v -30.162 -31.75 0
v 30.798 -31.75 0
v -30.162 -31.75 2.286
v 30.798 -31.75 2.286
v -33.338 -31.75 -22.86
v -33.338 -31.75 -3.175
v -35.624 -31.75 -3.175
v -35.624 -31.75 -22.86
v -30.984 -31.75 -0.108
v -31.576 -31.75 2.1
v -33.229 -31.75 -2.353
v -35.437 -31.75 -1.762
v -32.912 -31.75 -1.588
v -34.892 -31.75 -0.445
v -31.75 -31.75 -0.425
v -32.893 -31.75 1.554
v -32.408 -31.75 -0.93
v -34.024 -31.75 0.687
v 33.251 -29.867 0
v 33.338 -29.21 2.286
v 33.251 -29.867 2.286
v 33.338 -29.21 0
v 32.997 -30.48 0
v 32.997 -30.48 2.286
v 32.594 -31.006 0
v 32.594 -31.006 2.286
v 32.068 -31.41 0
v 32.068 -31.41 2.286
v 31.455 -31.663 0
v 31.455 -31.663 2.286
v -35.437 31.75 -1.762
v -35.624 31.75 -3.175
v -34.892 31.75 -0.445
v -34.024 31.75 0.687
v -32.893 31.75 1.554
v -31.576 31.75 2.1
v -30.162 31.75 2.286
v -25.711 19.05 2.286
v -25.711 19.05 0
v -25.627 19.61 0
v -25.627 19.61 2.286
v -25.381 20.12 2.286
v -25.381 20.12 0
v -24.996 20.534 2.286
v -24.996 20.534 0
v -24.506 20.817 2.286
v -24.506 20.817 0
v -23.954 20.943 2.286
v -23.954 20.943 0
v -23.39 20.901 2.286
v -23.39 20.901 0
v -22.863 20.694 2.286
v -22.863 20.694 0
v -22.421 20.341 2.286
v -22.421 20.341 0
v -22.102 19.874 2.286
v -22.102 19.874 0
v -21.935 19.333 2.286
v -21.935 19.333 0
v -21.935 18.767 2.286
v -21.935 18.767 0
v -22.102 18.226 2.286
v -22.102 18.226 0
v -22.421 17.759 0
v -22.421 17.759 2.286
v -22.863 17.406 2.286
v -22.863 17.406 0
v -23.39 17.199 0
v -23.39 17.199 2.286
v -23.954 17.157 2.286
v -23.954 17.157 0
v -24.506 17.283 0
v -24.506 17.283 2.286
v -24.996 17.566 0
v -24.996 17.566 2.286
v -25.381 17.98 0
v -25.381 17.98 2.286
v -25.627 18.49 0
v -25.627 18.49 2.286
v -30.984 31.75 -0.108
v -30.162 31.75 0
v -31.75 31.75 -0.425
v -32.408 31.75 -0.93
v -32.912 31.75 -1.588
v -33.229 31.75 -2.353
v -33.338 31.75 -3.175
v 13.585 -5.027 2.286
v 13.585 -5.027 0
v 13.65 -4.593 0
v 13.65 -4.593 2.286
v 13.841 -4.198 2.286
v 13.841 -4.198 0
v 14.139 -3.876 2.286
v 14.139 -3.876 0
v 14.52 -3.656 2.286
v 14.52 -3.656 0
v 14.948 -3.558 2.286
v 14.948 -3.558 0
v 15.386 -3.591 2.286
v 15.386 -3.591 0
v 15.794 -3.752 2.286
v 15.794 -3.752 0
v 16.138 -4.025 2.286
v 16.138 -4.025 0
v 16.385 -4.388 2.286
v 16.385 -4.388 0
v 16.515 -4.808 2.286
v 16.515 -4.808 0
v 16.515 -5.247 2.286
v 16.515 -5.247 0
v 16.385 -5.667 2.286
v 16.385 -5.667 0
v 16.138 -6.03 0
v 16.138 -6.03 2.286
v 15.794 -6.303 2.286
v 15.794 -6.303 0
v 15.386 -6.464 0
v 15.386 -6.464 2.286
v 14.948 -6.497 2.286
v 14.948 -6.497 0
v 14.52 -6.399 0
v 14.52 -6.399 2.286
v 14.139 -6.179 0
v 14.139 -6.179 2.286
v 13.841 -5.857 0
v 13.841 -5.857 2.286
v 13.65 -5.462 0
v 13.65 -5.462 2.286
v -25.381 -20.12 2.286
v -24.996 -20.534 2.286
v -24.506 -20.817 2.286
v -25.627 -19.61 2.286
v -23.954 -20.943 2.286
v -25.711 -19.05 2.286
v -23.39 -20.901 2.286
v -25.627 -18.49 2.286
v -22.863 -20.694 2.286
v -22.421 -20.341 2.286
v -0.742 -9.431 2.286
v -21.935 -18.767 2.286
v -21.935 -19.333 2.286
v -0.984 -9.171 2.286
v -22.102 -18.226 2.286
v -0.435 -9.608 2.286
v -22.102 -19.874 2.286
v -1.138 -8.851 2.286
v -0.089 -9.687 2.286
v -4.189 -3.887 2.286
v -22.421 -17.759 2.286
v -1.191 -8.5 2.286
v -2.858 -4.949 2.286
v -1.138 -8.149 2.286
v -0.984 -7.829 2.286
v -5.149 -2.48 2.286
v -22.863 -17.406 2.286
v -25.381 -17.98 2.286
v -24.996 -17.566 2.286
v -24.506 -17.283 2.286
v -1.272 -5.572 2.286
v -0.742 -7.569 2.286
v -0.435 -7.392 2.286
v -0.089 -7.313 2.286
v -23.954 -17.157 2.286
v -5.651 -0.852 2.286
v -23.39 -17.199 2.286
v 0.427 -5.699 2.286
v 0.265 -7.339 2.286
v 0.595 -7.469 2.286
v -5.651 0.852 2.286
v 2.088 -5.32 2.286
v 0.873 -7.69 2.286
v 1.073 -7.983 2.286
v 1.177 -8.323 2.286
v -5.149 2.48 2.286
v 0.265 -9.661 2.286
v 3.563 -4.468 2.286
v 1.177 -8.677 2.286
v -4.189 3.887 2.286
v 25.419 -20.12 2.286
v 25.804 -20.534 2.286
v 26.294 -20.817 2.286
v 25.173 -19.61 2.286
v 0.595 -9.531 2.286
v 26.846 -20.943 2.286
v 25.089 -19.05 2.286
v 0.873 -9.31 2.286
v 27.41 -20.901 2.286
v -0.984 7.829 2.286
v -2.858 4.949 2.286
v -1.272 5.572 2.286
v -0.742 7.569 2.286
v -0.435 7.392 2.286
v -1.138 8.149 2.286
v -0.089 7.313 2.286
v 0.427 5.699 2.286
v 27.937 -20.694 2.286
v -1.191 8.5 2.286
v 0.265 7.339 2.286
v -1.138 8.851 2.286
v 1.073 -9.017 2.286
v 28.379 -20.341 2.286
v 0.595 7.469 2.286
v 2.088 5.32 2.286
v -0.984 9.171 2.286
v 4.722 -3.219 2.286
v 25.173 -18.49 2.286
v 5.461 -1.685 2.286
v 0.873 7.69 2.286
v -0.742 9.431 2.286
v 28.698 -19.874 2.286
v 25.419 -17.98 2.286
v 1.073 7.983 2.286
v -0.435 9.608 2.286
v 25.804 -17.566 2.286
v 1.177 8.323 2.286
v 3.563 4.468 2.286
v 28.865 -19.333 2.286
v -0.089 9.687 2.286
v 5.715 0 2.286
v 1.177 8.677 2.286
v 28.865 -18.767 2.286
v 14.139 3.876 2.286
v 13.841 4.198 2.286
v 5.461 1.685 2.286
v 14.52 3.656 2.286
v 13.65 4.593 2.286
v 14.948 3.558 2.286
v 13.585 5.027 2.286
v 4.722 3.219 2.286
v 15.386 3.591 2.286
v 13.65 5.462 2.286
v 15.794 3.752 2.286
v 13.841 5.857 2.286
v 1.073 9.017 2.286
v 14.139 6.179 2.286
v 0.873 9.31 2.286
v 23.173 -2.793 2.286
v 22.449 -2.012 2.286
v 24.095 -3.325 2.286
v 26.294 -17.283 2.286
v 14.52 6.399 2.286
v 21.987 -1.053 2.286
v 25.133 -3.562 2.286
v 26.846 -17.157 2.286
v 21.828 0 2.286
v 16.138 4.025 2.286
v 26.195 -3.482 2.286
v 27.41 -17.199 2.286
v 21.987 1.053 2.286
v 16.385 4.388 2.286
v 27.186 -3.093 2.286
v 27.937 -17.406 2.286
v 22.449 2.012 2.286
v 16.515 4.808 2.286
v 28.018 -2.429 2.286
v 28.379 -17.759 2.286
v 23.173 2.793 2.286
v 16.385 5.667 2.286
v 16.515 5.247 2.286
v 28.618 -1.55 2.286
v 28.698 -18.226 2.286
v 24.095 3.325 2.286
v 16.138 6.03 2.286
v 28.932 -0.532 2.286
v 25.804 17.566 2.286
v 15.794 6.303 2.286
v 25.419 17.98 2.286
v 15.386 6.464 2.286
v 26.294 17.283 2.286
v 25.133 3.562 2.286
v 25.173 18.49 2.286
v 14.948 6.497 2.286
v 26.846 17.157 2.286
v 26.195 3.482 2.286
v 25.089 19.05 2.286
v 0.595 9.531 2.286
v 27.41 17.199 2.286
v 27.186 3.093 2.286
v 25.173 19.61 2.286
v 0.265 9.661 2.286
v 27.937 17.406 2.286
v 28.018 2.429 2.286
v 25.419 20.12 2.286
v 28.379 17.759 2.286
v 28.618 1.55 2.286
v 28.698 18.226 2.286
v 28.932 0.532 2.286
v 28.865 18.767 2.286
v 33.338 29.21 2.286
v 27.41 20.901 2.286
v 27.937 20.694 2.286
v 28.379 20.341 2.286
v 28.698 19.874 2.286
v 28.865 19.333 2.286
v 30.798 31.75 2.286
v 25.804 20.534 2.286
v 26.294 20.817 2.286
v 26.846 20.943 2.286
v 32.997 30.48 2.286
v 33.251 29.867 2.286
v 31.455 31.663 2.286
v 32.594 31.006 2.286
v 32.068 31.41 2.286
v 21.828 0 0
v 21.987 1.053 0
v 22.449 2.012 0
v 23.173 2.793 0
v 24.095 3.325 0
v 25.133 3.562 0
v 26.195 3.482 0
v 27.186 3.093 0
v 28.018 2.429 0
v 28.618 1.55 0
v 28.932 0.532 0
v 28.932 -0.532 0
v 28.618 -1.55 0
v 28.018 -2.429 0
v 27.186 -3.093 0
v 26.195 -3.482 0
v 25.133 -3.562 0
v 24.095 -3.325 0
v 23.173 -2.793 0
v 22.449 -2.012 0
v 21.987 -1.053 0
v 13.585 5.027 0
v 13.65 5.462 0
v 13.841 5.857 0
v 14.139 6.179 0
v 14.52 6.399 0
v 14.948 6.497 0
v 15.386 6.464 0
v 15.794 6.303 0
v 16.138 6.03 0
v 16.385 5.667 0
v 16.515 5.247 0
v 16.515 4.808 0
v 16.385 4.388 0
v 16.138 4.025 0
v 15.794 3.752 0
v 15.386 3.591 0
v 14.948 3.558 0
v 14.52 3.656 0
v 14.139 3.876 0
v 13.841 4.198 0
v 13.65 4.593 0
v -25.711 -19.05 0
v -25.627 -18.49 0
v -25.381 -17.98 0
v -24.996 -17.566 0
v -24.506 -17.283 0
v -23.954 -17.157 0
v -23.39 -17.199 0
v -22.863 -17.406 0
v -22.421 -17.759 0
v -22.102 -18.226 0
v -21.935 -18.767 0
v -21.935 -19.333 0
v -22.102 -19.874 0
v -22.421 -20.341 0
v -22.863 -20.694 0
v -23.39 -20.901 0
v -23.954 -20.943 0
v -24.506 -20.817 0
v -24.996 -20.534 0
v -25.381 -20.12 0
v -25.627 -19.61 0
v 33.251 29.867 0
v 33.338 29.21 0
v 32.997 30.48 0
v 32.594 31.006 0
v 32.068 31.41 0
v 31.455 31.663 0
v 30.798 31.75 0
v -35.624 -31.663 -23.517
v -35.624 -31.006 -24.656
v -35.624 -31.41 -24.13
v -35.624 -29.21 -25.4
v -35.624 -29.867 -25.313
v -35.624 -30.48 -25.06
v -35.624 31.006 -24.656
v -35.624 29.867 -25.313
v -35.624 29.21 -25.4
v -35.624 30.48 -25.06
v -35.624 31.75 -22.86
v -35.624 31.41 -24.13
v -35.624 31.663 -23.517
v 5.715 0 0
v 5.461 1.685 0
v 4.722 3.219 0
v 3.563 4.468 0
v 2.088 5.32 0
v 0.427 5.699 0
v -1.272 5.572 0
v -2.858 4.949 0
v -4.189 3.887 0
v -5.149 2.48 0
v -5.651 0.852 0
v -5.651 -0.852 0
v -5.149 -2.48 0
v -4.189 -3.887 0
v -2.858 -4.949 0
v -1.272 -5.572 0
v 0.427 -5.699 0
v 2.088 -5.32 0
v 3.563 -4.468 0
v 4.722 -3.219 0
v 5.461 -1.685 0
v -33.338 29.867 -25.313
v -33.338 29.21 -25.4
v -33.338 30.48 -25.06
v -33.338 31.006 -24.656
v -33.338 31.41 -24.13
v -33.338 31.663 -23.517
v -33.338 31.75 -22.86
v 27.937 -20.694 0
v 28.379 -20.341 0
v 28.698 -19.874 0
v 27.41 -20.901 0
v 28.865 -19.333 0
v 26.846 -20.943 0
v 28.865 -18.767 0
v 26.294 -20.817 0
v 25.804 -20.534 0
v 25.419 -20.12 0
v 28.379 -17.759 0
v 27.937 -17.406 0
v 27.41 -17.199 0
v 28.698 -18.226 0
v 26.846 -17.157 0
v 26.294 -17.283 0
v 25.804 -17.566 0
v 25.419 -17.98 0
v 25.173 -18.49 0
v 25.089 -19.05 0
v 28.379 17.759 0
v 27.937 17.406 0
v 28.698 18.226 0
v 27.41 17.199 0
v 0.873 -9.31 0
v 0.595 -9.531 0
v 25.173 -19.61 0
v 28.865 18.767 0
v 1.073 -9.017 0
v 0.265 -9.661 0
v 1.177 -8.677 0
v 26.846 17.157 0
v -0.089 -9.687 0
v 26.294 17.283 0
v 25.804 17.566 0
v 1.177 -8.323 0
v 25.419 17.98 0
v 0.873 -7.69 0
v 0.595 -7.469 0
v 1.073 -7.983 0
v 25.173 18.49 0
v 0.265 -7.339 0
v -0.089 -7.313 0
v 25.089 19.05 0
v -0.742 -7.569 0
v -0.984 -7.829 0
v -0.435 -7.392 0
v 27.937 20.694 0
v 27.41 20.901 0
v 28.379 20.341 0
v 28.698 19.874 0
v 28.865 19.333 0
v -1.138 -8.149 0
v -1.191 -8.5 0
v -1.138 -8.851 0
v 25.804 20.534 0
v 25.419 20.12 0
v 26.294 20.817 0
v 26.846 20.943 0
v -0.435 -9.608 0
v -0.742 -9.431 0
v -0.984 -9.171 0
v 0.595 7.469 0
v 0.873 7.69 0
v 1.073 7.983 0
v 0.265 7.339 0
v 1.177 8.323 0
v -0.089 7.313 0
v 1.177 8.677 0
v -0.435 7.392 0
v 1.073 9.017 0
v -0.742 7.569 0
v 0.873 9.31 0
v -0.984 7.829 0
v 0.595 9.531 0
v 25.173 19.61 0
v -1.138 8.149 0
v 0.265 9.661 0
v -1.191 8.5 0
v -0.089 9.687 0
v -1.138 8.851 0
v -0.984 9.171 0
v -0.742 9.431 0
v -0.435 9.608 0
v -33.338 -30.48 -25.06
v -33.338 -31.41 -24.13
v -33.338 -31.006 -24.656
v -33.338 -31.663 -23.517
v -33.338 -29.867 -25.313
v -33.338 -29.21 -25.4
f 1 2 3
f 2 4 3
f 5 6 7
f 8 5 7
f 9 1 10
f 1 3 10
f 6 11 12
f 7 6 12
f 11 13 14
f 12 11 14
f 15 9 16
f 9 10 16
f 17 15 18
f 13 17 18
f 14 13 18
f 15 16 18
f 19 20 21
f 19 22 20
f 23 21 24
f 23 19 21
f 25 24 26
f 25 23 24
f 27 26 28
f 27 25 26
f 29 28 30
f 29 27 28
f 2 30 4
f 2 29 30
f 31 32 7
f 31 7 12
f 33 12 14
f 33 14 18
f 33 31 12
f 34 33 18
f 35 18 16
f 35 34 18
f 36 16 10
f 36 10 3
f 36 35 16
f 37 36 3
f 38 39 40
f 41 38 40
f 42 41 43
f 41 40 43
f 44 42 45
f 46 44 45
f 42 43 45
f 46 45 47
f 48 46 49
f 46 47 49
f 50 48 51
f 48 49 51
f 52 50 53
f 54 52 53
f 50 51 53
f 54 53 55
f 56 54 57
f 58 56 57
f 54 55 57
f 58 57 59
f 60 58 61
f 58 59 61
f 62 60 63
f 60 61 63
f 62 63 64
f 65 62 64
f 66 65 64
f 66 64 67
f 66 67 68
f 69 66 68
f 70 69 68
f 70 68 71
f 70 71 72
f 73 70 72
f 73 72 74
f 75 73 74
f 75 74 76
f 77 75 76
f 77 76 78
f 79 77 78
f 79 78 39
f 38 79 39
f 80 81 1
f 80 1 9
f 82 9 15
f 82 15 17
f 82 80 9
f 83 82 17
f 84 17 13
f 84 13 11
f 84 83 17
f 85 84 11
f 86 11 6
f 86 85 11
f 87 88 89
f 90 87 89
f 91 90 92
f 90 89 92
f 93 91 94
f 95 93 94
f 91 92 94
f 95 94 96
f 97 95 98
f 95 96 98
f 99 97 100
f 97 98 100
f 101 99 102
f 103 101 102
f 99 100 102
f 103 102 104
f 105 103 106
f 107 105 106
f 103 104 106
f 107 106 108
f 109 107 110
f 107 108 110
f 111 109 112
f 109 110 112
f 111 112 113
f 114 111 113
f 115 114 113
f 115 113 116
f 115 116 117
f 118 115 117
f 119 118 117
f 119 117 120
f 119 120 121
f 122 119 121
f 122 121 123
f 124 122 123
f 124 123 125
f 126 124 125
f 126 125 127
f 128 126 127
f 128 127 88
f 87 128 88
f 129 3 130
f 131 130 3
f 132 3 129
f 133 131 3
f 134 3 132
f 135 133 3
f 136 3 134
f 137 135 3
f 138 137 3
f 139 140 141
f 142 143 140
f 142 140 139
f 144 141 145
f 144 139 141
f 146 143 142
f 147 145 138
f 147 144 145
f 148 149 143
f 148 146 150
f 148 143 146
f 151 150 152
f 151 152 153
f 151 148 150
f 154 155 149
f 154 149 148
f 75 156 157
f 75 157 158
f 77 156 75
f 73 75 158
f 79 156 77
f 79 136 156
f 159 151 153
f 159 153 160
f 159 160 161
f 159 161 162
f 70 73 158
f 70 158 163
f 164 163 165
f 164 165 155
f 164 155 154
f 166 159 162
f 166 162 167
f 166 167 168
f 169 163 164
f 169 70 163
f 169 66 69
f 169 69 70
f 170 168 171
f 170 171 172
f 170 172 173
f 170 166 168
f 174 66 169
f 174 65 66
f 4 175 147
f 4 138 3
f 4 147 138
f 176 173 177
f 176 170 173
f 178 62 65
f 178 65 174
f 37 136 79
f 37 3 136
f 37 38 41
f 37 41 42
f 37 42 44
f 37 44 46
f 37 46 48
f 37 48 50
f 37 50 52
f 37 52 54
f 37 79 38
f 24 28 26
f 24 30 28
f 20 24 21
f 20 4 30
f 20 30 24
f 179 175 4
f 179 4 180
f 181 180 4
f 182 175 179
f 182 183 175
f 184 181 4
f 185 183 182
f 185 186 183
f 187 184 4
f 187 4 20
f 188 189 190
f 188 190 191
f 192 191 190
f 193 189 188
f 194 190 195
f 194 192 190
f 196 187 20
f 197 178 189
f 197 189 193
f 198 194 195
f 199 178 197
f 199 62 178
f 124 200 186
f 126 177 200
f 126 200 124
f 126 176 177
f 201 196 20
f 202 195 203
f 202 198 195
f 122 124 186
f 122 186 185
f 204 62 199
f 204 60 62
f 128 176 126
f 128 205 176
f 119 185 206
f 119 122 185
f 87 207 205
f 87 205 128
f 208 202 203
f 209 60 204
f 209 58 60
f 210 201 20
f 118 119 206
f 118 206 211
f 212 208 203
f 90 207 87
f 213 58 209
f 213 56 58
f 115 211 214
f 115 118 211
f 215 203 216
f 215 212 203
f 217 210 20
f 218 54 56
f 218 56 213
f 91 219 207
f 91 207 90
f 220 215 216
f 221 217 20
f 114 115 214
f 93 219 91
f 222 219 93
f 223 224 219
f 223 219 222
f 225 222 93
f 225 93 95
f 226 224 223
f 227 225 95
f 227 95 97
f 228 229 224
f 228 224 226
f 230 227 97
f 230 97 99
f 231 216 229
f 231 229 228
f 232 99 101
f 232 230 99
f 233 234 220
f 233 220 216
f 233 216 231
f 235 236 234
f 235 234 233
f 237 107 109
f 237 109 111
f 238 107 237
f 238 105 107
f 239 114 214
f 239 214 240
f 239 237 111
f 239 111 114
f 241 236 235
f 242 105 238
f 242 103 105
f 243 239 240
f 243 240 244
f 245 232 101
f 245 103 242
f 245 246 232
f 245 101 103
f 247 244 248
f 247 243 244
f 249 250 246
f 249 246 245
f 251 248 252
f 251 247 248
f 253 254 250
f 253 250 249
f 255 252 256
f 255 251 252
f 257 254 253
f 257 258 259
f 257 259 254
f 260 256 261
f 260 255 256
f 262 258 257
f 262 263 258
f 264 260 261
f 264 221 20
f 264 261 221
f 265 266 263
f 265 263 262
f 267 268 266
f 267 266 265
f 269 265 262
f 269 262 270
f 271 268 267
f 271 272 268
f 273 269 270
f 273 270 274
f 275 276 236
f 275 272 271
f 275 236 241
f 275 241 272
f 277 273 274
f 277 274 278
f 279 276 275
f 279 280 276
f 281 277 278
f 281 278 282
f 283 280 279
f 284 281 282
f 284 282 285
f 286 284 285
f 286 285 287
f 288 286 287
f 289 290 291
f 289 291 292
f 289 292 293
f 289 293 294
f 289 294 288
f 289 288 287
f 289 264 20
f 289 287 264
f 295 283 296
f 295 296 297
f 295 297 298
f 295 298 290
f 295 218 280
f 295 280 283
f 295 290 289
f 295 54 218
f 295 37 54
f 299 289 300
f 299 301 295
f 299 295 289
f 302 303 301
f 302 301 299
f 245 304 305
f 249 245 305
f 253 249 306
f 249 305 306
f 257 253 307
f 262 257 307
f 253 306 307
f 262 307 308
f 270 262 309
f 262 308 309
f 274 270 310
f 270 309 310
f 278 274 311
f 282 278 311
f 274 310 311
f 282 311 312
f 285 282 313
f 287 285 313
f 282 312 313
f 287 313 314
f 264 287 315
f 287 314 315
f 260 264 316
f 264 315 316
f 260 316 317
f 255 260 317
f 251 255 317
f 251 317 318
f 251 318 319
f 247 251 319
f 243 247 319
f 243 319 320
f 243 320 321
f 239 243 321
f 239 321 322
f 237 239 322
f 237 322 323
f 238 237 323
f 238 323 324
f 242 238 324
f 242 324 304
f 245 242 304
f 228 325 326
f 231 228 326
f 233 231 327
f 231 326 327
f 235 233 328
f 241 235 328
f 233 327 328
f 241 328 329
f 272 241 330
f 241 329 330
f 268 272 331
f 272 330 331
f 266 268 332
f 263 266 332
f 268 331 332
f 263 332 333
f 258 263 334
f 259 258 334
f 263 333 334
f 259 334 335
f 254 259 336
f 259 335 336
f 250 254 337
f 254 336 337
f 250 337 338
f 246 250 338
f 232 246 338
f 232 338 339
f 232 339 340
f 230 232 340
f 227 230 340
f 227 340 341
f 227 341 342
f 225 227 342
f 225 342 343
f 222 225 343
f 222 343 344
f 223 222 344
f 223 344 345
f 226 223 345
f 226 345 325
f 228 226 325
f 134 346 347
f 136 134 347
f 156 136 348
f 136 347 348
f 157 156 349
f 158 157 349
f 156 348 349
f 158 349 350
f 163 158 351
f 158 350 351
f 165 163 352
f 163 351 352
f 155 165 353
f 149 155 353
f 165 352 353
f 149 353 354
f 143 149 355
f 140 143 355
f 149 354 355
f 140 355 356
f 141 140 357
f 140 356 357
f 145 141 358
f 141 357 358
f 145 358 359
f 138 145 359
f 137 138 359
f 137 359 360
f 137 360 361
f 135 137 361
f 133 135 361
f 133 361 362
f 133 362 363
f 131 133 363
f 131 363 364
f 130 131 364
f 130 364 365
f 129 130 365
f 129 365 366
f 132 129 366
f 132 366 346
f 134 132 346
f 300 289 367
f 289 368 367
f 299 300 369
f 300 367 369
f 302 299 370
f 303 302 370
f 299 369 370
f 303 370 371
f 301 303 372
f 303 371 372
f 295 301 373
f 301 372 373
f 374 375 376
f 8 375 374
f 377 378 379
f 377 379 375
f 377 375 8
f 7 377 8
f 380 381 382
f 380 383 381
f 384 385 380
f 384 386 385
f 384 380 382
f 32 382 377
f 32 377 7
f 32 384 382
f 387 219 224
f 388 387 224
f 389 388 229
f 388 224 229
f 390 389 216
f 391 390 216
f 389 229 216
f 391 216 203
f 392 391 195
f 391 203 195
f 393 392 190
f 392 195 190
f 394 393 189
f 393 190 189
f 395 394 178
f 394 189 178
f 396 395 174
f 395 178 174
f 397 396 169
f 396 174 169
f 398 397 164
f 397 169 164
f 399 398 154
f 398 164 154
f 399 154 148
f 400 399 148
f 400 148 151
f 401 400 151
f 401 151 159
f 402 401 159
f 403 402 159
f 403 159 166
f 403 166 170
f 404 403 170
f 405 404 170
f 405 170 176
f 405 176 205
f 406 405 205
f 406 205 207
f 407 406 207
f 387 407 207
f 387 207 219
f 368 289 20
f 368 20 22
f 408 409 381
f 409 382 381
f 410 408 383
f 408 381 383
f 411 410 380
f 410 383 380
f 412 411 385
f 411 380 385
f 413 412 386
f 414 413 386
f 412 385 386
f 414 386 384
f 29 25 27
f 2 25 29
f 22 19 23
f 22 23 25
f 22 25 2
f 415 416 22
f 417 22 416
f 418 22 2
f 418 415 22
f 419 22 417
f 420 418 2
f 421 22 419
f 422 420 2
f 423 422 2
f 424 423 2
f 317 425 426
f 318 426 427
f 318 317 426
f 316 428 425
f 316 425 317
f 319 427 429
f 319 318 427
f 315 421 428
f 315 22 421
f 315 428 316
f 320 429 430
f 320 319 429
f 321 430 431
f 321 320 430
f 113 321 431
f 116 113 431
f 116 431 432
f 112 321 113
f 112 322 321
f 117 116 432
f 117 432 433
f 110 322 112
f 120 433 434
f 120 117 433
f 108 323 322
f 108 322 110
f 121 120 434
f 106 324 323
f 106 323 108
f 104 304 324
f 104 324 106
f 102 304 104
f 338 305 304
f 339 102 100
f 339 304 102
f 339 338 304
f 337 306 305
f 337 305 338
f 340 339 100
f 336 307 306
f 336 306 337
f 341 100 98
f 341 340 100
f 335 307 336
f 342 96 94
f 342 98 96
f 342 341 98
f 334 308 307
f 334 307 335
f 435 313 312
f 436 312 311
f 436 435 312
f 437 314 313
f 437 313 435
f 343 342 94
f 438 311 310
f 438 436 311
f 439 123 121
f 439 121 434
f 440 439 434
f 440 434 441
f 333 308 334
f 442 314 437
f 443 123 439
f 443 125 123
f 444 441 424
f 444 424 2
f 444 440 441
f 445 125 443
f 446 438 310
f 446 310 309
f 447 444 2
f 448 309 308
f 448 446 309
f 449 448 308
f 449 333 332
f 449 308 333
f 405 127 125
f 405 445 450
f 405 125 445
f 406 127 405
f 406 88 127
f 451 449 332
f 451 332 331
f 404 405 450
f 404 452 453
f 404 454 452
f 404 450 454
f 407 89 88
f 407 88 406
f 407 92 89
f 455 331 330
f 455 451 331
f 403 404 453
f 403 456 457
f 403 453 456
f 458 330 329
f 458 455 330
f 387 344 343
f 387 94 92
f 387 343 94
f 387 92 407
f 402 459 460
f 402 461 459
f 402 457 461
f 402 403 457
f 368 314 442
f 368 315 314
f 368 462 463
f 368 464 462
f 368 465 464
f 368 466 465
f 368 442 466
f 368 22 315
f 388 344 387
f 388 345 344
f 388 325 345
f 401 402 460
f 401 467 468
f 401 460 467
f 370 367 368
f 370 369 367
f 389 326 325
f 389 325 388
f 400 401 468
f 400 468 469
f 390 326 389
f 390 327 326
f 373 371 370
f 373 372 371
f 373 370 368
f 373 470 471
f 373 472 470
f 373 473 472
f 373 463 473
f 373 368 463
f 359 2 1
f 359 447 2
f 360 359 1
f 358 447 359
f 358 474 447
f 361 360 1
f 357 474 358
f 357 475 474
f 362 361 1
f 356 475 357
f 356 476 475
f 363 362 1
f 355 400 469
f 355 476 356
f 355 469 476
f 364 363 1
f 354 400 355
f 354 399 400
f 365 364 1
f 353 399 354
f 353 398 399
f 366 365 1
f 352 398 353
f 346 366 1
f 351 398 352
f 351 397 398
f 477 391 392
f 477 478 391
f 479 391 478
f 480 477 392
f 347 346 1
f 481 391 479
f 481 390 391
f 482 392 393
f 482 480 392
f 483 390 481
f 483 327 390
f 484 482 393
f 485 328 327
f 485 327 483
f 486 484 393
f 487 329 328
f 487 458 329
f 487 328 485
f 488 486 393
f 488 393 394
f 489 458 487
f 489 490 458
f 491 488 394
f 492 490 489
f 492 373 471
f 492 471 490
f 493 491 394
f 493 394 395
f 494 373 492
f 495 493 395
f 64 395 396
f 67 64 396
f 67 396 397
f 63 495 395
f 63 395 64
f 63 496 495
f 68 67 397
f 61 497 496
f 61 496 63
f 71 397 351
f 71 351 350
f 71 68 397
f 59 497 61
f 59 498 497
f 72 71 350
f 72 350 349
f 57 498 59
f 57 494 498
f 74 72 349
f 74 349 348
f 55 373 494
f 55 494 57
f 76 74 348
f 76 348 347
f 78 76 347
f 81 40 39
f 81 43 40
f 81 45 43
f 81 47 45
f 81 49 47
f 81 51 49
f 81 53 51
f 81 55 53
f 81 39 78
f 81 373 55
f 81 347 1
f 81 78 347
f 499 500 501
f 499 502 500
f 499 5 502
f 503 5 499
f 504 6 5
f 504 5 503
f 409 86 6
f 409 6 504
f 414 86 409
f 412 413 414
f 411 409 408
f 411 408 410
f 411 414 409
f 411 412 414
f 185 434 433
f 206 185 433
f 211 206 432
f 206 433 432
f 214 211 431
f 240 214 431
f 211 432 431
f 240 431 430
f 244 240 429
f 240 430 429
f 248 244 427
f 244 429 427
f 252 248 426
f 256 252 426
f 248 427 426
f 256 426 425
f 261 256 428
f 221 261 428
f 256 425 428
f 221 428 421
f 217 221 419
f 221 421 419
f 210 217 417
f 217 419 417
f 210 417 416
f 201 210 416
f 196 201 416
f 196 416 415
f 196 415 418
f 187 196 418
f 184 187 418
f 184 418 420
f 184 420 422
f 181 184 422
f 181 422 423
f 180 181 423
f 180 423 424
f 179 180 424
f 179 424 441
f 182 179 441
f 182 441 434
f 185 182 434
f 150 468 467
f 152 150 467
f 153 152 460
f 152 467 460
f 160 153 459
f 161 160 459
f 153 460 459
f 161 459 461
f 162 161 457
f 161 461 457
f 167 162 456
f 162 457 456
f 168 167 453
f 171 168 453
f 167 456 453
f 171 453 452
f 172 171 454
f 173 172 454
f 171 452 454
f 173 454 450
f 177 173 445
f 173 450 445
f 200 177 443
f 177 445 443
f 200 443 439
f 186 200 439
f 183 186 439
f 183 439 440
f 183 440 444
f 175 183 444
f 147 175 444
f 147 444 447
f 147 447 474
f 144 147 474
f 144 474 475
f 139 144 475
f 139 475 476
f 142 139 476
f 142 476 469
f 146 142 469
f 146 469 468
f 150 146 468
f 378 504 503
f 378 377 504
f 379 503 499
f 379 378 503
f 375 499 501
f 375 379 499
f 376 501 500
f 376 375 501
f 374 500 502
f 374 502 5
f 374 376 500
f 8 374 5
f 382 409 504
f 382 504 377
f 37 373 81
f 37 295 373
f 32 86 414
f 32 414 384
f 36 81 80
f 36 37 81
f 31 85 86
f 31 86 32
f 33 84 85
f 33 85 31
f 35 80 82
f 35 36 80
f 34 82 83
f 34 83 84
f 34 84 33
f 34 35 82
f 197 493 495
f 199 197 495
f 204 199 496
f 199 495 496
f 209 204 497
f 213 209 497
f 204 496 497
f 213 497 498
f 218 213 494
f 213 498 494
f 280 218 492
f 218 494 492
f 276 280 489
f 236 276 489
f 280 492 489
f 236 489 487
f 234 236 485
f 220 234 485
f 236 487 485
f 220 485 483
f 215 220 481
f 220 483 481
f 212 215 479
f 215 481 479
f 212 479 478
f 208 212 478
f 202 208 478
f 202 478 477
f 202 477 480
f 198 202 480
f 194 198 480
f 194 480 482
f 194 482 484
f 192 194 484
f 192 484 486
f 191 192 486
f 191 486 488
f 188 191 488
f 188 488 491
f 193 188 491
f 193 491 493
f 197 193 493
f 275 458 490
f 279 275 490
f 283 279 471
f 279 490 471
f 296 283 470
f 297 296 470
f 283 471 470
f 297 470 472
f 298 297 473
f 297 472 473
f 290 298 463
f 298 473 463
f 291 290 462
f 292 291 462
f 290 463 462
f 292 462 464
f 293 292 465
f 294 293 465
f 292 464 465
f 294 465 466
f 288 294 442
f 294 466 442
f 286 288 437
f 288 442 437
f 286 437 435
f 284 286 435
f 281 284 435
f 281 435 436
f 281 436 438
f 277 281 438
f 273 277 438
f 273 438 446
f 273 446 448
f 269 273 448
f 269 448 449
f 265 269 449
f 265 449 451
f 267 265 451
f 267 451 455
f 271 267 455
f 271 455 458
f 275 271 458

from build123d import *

# Parameters (mm, degrees)
BASE_FLANGE1_DEPTH              = 31.75
FILLET1_R                       = 2.54
F_25_0_1495_DIAMETER_HOLE1_D    = 3.7973
SKETCH10_R                      = 5.715
CUT_EXTRUDE1_DEPTH              = 56.168930099
F_9_32_0_28125_DIAMETER_HOLE1_D = 7.14375
F_3_32_0_09375_DIAMETER_HOLE1_D = 2.38125
F_32_0_116_DIAMETER_HOLE1_D     = 2.9464


# Sheet-metal steps are written as plain solids
with BuildPart() as part:
    # Sketch3 → Base-Flange1 (new, symmetric)
    with BuildSketch(Plane(origin=(0, 0, 0), x_dir=(-1, 0, 0), z_dir=(0, 1, 0))):
        with BuildLine():
            Line((-33.3375, 0), (30.1625, 0))
            ThreePointArc((30.1625, 0), (32.40756403, -0.92993597), (33.3375, -3.175))
            Line((33.3375, -3.175), (33.3375, -25.4))
            Line((33.3375, -25.4), (35.6235, -25.4))
            Line((35.6235, -25.4), (35.6235, -3.175))
            ThreePointArc((35.6235, -3.175), (34.024010132, 0.686510132), (30.1625, 2.286))
            Line((30.1625, 2.286), (-33.3375, 2.286))
            Line((-33.3375, 2.286), (-33.3375, 0))
        make_face()
    extrude(amount=BASE_FLANGE1_DEPTH, both=True)

    # Fillet1
    fillet1_edges = [part.edges().sort_by_distance(p)[0] for p in [
        (33.3375, 31.75, 1.143),
        (33.3375, -31.75, 1.143),
        (-34.4805, 31.75, -25.4),
        (-34.4805, -31.75, -25.4),
    ]]
    fillet(fillet1_edges, radius=FILLET1_R)

    # #25 (0.1495) Diameter Hole1 (through all)
    with Locations(Plane.XY.offset(2.286)):
        with Locations((-23.8125, 19.05), (26.9875, 19.05), (26.9875, -19.05), (-23.8125, -19.05)):
            Hole(F_25_0_1495_DIAMETER_HOLE1_D / 2)

    # Sketch10 → Cut-Extrude1 (cut, through all)
    with BuildSketch(Plane.XY.offset(2.286)):
        Circle(SKETCH10_R)
    extrude(amount=-CUT_EXTRUDE1_DEPTH, mode=Mode.SUBTRACT)

    # 9/32 (0.28125) Diameter Hole1 (through all)
    with Locations(Plane.XY.offset(2.286)):
        with Locations((25.4, 0)):
            Hole(F_9_32_0_28125_DIAMETER_HOLE1_D / 2)

    # 3/32 (0.09375) Diameter Hole1 (through all)
    with Locations(Plane.XY.offset(2.286)):
        with Locations((0, 8.5), (0, -8.5)):
            Hole(F_3_32_0_09375_DIAMETER_HOLE1_D / 2)

    # #32 (0.116) Diameter Hole1 (through all)
    with Locations(Plane.XY.offset(2.286)):
        with Locations((15.057884182, 5.027499276), (15.057884182, -5.027499276)):
            Hole(F_32_0_116_DIAMETER_HOLE1_D / 2)


solid = part.part
